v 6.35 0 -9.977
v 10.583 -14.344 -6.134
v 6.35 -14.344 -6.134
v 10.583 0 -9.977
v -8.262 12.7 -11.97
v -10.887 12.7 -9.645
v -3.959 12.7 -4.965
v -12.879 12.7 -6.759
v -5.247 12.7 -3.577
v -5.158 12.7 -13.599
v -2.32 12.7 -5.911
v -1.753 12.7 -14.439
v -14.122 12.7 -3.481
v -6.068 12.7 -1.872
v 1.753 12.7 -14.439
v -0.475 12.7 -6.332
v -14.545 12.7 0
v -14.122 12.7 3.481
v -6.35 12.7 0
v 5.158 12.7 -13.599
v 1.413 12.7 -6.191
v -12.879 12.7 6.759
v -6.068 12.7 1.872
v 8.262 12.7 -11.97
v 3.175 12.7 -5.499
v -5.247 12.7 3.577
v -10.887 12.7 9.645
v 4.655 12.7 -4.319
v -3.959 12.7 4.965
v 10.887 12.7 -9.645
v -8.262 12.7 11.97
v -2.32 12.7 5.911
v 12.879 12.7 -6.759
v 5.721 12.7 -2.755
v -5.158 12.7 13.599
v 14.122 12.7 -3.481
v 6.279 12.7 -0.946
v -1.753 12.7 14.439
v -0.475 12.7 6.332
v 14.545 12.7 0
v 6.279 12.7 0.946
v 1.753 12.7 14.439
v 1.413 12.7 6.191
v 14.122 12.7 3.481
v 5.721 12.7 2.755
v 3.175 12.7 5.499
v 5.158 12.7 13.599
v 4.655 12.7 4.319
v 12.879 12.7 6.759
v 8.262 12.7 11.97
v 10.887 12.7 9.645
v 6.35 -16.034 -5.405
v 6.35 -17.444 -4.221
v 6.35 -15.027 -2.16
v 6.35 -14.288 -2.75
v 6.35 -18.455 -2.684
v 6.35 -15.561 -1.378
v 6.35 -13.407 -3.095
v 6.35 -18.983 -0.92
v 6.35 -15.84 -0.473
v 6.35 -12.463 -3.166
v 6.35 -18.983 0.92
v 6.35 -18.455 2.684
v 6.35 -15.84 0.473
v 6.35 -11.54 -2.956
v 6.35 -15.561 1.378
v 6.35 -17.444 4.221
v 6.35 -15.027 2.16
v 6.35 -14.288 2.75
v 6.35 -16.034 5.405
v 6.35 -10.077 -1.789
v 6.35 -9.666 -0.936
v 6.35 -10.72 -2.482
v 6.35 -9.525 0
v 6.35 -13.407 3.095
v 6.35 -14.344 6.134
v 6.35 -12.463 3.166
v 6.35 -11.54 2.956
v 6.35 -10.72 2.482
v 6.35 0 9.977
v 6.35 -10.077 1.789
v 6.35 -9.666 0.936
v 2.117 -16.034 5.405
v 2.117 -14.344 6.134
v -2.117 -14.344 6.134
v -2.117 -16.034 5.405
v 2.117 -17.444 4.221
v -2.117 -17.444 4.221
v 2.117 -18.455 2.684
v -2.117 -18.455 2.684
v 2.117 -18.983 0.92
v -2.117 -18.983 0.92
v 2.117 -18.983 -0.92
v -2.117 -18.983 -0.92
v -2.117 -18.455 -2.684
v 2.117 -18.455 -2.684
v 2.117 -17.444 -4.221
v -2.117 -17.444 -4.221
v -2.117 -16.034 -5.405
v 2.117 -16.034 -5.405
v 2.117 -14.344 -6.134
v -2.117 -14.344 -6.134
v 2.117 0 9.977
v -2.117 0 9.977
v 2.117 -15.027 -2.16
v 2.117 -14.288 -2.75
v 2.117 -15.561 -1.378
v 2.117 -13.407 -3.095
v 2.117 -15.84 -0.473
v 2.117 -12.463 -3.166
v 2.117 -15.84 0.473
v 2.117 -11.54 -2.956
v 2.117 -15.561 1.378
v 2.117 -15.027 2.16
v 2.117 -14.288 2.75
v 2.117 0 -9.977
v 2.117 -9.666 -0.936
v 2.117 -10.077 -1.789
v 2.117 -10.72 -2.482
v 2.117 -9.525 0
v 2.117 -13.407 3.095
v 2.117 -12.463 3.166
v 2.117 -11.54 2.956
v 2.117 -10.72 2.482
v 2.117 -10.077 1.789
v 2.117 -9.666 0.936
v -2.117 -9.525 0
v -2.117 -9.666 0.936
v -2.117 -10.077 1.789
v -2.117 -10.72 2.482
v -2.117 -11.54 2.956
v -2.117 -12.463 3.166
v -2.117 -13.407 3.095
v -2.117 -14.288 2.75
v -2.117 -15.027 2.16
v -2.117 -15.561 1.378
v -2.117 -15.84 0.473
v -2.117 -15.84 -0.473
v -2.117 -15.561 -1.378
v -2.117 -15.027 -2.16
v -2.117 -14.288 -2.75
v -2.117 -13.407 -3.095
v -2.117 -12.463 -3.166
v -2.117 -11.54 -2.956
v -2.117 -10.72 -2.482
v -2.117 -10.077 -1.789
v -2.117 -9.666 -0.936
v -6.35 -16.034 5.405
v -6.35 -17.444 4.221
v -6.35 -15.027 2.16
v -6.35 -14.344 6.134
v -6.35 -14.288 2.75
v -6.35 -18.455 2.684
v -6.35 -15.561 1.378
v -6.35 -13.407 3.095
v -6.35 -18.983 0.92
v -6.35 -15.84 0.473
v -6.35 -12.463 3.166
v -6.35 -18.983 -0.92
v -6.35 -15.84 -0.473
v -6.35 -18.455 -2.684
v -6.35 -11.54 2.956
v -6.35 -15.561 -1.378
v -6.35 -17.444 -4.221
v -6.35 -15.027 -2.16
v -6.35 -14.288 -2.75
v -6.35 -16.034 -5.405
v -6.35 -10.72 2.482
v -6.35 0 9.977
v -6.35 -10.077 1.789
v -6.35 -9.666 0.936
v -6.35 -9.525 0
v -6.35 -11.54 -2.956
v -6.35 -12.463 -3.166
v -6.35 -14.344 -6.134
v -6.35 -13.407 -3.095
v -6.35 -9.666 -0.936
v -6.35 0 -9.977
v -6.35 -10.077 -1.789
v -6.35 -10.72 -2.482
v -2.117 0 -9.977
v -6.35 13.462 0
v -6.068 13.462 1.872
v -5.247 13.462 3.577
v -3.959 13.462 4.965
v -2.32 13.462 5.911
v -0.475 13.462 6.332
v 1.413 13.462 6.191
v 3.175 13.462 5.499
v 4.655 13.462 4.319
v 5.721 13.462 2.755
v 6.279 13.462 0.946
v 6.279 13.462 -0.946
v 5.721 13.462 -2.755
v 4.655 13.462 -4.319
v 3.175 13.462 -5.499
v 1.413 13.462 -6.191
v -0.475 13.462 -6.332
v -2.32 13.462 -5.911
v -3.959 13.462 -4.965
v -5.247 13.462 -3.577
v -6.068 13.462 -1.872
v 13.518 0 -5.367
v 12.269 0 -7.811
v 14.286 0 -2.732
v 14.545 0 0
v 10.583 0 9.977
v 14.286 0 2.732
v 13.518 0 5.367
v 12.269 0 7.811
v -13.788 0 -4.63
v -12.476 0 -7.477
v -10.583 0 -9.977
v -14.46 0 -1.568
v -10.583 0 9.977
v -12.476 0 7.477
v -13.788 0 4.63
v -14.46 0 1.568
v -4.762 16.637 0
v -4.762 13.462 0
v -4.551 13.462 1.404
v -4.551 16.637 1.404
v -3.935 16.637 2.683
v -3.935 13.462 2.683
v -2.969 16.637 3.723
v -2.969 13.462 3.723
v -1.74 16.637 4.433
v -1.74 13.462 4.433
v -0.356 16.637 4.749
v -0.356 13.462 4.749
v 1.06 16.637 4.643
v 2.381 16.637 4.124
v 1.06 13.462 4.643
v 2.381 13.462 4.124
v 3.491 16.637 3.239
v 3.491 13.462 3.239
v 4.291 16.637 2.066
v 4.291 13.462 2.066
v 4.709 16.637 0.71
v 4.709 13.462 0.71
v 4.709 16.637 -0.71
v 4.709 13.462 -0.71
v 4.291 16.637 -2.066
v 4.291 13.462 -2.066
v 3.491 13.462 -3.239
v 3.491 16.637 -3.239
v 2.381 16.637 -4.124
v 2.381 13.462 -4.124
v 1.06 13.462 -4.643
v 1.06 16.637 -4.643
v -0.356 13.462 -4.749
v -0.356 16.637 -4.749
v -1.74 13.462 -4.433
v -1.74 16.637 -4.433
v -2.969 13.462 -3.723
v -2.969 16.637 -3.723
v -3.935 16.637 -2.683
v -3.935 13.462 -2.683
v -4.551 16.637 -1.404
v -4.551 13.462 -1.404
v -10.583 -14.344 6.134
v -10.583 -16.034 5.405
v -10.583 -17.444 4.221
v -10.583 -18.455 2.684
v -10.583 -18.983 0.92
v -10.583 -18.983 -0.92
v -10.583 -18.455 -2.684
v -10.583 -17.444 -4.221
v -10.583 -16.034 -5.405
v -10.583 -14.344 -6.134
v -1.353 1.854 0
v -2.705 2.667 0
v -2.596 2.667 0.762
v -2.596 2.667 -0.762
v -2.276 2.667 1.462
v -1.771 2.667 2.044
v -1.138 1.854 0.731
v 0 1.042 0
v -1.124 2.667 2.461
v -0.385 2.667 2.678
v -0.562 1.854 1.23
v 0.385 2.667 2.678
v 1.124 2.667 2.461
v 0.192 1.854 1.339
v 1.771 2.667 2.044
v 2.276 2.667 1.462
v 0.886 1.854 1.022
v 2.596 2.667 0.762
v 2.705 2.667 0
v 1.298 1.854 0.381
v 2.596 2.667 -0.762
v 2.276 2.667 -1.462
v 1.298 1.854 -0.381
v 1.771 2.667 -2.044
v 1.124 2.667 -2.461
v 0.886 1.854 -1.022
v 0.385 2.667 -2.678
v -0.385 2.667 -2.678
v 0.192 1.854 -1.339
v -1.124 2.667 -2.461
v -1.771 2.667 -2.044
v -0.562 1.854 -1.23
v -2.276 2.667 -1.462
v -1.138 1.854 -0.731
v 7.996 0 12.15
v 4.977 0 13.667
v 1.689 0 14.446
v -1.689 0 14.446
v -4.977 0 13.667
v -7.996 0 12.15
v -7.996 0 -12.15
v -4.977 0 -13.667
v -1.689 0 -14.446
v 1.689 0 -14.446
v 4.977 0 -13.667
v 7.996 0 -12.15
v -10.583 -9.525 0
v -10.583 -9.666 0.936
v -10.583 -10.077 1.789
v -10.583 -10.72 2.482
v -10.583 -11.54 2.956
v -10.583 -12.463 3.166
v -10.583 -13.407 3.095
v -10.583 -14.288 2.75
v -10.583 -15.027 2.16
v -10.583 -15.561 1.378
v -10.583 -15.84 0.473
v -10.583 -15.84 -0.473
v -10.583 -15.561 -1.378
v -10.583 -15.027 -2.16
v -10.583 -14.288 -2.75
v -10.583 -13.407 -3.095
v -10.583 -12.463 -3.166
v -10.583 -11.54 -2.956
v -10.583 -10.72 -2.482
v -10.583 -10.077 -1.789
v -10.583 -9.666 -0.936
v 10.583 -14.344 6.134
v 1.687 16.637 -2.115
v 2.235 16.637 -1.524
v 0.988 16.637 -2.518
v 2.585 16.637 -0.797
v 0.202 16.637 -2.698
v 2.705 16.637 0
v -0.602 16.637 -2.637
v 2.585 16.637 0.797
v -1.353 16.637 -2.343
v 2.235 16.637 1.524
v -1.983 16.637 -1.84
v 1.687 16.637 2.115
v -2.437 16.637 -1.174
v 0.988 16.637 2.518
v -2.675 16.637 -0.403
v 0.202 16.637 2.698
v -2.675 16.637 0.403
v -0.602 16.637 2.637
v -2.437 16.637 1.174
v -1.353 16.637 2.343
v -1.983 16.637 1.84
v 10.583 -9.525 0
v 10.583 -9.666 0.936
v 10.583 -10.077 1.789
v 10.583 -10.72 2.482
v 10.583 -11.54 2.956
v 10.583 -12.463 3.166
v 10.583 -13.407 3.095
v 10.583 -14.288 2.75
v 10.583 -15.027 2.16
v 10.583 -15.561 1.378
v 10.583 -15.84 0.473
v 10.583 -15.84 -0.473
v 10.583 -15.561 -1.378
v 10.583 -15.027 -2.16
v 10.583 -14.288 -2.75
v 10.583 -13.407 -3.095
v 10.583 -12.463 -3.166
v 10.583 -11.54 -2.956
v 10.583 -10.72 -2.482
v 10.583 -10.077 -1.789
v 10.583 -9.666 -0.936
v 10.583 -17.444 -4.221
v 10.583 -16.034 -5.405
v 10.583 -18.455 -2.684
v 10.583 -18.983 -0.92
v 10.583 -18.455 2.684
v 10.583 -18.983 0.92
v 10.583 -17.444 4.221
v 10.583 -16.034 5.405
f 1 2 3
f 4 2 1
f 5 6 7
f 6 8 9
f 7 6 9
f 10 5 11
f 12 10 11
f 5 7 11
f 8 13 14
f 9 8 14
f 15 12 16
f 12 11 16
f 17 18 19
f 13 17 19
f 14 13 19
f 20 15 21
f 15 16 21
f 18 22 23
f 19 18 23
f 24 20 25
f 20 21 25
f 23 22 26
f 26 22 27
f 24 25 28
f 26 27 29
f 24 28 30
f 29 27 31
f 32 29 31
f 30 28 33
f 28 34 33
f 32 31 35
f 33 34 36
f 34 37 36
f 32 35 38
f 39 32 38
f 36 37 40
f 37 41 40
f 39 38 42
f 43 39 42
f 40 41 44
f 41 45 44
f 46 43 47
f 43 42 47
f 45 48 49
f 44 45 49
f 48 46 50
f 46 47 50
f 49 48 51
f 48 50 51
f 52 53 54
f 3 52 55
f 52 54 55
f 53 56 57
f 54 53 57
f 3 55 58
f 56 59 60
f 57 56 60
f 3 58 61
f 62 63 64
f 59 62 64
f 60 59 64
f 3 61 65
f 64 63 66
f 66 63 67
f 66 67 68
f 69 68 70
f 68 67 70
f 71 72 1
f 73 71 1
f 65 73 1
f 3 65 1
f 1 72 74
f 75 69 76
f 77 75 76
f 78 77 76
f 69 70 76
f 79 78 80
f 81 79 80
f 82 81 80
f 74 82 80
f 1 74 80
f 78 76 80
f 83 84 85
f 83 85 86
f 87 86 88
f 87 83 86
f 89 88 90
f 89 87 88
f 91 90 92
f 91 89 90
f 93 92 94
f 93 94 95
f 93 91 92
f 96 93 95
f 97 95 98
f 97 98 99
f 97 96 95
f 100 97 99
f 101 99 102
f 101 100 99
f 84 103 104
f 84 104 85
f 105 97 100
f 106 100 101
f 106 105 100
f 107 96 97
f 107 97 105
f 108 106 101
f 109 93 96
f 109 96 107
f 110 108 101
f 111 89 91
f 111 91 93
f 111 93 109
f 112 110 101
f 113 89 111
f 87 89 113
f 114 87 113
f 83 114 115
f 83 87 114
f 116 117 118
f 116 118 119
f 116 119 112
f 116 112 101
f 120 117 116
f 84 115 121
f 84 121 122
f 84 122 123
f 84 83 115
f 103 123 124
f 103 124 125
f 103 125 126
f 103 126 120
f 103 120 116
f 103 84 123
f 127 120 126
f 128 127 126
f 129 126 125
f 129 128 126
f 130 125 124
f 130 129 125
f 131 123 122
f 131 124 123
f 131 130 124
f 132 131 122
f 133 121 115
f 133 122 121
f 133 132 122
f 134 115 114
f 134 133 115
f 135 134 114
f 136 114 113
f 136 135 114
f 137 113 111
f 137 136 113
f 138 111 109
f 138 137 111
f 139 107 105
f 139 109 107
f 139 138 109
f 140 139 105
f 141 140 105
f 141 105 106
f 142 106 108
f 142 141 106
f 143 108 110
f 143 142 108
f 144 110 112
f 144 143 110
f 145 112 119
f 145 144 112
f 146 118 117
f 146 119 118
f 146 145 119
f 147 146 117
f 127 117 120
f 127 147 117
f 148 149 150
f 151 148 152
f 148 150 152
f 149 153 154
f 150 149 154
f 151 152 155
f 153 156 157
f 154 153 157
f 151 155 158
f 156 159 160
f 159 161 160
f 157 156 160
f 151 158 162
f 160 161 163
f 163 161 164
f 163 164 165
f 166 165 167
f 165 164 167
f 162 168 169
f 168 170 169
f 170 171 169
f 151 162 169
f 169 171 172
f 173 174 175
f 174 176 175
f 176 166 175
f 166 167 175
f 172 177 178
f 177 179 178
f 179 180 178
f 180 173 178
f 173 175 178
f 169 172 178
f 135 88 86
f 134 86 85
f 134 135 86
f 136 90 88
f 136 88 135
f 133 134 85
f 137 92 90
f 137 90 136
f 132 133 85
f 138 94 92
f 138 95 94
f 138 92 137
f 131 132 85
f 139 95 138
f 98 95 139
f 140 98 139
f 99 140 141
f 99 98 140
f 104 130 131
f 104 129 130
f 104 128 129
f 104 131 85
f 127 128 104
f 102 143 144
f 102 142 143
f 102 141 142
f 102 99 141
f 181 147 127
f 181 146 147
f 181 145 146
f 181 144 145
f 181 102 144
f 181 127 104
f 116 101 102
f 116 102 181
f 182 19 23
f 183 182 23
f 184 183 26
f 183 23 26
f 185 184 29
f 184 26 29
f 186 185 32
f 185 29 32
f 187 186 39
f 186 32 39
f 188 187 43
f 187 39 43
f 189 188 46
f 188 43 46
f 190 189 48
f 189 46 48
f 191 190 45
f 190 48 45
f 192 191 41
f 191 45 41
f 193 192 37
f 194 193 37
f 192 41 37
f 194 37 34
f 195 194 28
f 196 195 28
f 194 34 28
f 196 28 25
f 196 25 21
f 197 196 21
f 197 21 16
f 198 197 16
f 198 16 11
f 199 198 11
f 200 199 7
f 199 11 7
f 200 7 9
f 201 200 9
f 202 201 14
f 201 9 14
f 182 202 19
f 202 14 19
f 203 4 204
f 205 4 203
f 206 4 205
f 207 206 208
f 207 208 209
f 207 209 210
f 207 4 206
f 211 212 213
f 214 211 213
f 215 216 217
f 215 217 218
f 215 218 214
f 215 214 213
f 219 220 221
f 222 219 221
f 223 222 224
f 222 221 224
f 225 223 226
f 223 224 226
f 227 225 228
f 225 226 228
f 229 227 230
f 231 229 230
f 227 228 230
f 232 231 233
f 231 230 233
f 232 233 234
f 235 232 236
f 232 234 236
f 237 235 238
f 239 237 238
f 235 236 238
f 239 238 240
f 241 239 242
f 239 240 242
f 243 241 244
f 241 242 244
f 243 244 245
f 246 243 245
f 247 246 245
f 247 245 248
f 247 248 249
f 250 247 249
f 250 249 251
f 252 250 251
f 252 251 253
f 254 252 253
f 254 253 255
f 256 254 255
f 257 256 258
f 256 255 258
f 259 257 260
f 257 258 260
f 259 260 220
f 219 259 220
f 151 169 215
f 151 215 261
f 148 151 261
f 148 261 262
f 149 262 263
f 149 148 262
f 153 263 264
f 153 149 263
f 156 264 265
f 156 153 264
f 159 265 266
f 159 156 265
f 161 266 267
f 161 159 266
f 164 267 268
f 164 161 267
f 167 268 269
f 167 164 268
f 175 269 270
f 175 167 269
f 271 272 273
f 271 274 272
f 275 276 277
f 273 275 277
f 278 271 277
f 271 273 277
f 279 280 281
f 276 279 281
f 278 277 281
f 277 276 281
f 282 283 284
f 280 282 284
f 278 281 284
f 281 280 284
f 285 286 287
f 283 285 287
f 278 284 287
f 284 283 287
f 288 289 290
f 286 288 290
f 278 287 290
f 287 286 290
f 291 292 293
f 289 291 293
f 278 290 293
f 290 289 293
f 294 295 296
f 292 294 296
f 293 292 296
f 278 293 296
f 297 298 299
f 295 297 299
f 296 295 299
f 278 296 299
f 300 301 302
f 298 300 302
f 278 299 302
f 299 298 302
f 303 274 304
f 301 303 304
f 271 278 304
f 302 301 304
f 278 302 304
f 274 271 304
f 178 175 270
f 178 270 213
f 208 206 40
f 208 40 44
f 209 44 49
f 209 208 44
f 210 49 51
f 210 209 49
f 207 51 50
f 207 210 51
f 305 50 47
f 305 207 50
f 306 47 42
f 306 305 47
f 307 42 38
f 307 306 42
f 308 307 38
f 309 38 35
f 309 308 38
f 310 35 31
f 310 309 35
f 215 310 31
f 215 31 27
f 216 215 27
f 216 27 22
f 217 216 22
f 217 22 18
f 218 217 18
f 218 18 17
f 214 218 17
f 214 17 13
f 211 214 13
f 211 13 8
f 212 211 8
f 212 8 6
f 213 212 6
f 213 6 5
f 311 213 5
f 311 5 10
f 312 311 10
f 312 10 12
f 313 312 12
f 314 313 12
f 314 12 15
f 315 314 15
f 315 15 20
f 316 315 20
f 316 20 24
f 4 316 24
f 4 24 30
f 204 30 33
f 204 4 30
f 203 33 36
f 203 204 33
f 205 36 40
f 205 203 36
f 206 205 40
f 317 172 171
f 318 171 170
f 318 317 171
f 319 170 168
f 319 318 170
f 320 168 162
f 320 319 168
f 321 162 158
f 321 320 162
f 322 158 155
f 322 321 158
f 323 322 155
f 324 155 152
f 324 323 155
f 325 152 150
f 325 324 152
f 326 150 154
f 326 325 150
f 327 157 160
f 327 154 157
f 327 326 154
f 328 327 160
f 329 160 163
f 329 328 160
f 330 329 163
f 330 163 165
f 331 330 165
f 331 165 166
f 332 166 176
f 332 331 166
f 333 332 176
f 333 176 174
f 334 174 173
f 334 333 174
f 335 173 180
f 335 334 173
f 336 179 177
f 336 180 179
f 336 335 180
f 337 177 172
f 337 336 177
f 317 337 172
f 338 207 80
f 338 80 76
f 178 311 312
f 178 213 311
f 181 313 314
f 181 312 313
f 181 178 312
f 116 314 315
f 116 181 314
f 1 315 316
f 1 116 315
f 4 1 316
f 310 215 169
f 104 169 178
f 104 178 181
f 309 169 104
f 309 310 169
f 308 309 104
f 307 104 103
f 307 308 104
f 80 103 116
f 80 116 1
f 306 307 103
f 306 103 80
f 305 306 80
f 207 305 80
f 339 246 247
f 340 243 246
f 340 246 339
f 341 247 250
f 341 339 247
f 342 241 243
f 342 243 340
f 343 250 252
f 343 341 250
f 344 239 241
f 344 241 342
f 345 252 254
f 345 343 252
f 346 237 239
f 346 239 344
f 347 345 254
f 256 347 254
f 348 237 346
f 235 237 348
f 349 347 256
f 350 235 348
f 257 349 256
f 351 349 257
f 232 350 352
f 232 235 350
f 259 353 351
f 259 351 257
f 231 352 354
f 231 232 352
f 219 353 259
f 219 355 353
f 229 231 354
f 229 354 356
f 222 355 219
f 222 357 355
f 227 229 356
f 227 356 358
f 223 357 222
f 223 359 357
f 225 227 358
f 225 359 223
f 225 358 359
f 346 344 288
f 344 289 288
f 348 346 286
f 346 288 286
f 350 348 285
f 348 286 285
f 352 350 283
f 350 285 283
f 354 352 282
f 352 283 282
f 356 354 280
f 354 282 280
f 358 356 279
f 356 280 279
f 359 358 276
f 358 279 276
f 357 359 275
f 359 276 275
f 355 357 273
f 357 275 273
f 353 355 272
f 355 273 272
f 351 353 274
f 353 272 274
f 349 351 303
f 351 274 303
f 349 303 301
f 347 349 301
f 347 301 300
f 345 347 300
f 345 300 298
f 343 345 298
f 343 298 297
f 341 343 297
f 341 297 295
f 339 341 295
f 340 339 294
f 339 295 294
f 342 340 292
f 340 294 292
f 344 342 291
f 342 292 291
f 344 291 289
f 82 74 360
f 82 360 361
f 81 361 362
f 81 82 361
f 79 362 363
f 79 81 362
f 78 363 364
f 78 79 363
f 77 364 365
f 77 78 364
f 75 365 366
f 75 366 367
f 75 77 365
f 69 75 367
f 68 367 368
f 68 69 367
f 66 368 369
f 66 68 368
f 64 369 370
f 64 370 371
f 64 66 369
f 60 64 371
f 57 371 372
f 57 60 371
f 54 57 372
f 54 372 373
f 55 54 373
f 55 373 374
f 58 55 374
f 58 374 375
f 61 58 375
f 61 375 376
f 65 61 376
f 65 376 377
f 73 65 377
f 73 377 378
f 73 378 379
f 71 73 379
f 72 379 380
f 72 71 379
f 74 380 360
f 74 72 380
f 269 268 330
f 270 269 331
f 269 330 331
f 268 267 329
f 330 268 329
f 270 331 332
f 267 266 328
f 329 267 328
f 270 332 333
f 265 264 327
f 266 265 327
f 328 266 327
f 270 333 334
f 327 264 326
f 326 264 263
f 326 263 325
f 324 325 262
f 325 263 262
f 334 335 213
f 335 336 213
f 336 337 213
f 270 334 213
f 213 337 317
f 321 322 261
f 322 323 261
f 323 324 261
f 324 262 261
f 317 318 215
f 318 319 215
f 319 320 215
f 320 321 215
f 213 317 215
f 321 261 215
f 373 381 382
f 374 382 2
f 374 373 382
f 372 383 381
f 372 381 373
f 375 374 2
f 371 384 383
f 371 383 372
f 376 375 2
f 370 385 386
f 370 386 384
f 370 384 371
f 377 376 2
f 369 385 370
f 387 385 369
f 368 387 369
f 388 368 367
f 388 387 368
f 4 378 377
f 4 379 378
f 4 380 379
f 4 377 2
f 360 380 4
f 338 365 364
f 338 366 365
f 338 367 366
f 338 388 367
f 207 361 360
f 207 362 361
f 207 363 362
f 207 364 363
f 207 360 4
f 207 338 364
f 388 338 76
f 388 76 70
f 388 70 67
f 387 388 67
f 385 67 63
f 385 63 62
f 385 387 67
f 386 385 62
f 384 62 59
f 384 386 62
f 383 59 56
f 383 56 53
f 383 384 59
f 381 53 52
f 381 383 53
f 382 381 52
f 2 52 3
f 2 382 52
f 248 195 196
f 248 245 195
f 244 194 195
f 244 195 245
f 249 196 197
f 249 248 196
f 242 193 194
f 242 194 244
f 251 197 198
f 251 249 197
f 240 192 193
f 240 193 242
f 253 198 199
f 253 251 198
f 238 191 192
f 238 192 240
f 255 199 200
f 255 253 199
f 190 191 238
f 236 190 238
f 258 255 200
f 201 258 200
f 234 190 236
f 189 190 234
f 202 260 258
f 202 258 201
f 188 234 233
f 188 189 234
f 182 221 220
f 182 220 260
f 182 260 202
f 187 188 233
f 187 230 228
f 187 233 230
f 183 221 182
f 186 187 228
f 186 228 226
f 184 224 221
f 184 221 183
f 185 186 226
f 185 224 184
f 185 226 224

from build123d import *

# Parameters (mm, degrees)
F0_R      = 3.175
F1_DEPTH  = 10.5833333333
F2_R      = 14.544643177
F3_DEPTH  = 12.7
F4_W      = 4.2333333333
F4_H      = 19.05
F5_DEPTH  = 76.2
F6_R      = 6.35
F7_DEPTH  = 0.762
F8_R      = 4.7625
F9_DEPTH  = 3.175
F11_D     = 5.4102
F11_DEPTH = 13.97
F11_TIP   = 1.6253880605


with BuildPart() as f1:
    # F0 (on Right) → F1 (new body, symmetric)
    with BuildSketch(Plane.YZ):
        with BuildLine():
            ThreePointArc((-14.3435009364, 6.1336289969), (-19.05, 0), (-14.3435009364, -6.1336289969))
            Line((-14.3435009364, -6.1336289969), (0, -9.9769584895))
            Line((0, -9.9769584895), (0, 9.9769584895))
            Line((0, 9.9769584895), (-14.3435009364, 6.1336289969))
        make_face()
        with Locations((-12.7, 0)):
            Circle(F0_R, mode=Mode.SUBTRACT)
    extrude(amount=F1_DEPTH, both=True)

    # F2 (on Front) → F3 (join)
    with BuildSketch(Plane.XZ):
        Circle(F2_R)
    extrude(amount=-F3_DEPTH)

    # F4 (on Top) → F5 (cut, symmetric)
    with BuildSketch(Plane.XY):
        with Locations((-4.2333333333, -9.525)):
            Rectangle(F4_W, F4_H)
        with Locations((4.2333333333, -9.525)):
            Rectangle(F4_W, F4_H)
    extrude(amount=F5_DEPTH, both=True, mode=Mode.SUBTRACT)

    # F6 (on face) → F7 (join)
    with BuildSketch(Plane(origin=(0, 12.7, 0), x_dir=(-1, 0, 0), z_dir=(0, 1, 0))):
        Circle(F6_R)
    extrude(amount=F7_DEPTH)

    # F8 (on face) → F9 (join)
    with BuildSketch(Plane(origin=(0, 13.462, 0), x_dir=(-1, 0, 0), z_dir=(0, 1, 0))):
        Circle(F8_R)
    extrude(amount=F9_DEPTH)

    # F11
    with Locations(Plane(origin=(0, 16.637, 0), x_dir=(-1, 0, 0), z_dir=(0, 1, 0))):
        with Locations((0, 0)):
            Hole(F11_D / 2, depth=F11_DEPTH)
            with Locations((0, 0, -(F11_DEPTH + F11_TIP / 2))):  # 118° drill point
                Cone(0, F11_D / 2, F11_TIP, mode=Mode.SUBTRACT)


solid = f1.part
